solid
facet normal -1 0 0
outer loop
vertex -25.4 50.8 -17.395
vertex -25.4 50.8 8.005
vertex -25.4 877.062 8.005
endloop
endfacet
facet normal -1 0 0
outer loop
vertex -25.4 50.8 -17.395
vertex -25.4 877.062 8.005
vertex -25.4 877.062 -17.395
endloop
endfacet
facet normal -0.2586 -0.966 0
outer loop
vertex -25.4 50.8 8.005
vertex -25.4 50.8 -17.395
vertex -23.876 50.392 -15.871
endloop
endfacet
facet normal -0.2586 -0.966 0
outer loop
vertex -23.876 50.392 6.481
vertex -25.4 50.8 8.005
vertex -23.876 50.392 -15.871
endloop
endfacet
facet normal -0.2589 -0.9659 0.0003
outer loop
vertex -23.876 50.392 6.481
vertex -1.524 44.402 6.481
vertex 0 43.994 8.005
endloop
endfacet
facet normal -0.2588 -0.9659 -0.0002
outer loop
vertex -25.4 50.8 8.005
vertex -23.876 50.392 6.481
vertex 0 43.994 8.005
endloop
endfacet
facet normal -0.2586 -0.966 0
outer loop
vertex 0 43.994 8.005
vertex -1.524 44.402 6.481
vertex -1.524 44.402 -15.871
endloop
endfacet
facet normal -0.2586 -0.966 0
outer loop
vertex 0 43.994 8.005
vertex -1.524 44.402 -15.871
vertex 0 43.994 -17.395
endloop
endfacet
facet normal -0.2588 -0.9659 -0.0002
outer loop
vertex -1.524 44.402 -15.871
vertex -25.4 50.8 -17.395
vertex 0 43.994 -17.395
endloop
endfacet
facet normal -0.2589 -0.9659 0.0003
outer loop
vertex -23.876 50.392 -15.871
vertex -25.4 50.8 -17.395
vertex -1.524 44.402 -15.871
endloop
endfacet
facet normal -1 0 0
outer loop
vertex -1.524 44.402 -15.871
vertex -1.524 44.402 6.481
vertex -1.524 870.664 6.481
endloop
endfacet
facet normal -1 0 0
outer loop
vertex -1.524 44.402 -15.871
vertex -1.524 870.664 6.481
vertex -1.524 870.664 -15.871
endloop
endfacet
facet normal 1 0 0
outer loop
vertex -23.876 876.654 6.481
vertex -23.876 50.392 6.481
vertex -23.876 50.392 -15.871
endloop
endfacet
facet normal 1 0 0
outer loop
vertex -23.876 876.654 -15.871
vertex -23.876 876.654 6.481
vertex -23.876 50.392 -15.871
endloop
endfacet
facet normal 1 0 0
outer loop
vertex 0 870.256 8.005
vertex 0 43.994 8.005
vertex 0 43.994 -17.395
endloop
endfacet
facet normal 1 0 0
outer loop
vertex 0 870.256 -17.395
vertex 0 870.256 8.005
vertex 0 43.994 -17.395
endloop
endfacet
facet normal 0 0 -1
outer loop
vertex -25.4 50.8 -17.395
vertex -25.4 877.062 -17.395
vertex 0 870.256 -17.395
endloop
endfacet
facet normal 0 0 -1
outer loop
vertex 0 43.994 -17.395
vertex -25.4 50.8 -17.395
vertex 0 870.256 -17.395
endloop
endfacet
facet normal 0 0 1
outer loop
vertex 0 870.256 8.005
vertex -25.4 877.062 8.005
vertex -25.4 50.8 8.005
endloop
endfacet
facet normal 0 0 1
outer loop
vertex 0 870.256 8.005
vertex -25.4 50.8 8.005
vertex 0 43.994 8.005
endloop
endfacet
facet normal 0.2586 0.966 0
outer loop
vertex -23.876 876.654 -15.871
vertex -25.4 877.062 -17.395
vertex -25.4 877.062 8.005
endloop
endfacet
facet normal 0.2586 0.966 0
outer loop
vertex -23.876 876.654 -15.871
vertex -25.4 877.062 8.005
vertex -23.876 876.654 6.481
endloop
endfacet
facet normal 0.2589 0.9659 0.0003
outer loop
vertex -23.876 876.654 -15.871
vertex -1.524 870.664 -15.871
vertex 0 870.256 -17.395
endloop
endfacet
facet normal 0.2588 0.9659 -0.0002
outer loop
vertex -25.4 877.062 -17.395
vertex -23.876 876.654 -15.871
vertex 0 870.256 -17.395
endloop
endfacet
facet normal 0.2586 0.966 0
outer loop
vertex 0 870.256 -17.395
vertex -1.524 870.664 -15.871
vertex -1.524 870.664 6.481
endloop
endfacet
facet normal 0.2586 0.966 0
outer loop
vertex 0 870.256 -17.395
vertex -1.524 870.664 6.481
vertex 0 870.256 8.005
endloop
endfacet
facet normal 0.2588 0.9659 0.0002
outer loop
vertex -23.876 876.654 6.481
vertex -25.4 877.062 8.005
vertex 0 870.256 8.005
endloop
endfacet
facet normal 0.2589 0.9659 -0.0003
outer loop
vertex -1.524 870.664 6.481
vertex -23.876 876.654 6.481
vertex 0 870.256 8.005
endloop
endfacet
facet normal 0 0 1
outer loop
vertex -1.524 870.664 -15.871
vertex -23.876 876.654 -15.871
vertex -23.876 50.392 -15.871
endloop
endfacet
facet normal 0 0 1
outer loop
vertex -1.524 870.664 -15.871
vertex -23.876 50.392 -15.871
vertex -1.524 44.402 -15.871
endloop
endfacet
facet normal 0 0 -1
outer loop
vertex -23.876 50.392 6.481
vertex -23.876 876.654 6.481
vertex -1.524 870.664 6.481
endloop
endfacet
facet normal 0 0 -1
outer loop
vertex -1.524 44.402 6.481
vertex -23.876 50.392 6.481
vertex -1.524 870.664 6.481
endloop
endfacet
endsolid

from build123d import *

# Parameters (mm, degrees)
SKETCH1_W               = 25.4
SKETCH1_H               = 25.4
SKETCH1_W_2             = 22.352
SKETCH1_H_2             = 22.352
BOSS_EXTRUDE1_DEPTH     = 877.062
CUT_EXTRUDE1_DEPTH      = 1
CUT_EXTRUDE1_DEPTH_BACK = 26.4
CUT_EXTRUDE2_DEPTH      = 1
CUT_EXTRUDE2_DEPTH_BACK = 26.4


with BuildPart() as part:
    # Sketch1 → Boss-Extrude1 (new body)
    with BuildSketch(Plane(origin=(0, 0, 0), x_dir=(1, 0, 0), z_dir=(0, 1, 0))):
        with Locations((-12.7, 4.695189487)):
            Rectangle(SKETCH1_W, SKETCH1_H)
        with Locations((-12.7, 4.695189487)):
            Rectangle(SKETCH1_W_2, SKETCH1_H_2, mode=Mode.SUBTRACT)
    extrude(amount=BOSS_EXTRUDE1_DEPTH)

    # Sketch2 → Cut-Extrude1 (cut, two sides)
    with BuildSketch(Plane.XY.offset(8.004810513)) as cut_extrude1_sk:
        Polygon((-25.4, 877.062), (0, 870.256090512), (0, 877.062), align=None)
    extrude(amount=CUT_EXTRUDE1_DEPTH, mode=Mode.SUBTRACT)
    extrude(cut_extrude1_sk.sketch, amount=-CUT_EXTRUDE1_DEPTH_BACK, mode=Mode.SUBTRACT)

    # Sketch3 → Cut-Extrude2 (cut, two sides)
    with BuildSketch(Plane(origin=(0, 0, -17.395189487), x_dir=(-1, 0, 0), z_dir=(0, 0, -1))) as cut_extrude2_sk:
        Polygon((25.4, 0), (25.4, 50.8), (0, 43.994090512), (0, 0), align=None)
    extrude(amount=CUT_EXTRUDE2_DEPTH, mode=Mode.SUBTRACT)
    extrude(cut_extrude2_sk.sketch, amount=-CUT_EXTRUDE2_DEPTH_BACK, mode=Mode.SUBTRACT)


solid = part.part
